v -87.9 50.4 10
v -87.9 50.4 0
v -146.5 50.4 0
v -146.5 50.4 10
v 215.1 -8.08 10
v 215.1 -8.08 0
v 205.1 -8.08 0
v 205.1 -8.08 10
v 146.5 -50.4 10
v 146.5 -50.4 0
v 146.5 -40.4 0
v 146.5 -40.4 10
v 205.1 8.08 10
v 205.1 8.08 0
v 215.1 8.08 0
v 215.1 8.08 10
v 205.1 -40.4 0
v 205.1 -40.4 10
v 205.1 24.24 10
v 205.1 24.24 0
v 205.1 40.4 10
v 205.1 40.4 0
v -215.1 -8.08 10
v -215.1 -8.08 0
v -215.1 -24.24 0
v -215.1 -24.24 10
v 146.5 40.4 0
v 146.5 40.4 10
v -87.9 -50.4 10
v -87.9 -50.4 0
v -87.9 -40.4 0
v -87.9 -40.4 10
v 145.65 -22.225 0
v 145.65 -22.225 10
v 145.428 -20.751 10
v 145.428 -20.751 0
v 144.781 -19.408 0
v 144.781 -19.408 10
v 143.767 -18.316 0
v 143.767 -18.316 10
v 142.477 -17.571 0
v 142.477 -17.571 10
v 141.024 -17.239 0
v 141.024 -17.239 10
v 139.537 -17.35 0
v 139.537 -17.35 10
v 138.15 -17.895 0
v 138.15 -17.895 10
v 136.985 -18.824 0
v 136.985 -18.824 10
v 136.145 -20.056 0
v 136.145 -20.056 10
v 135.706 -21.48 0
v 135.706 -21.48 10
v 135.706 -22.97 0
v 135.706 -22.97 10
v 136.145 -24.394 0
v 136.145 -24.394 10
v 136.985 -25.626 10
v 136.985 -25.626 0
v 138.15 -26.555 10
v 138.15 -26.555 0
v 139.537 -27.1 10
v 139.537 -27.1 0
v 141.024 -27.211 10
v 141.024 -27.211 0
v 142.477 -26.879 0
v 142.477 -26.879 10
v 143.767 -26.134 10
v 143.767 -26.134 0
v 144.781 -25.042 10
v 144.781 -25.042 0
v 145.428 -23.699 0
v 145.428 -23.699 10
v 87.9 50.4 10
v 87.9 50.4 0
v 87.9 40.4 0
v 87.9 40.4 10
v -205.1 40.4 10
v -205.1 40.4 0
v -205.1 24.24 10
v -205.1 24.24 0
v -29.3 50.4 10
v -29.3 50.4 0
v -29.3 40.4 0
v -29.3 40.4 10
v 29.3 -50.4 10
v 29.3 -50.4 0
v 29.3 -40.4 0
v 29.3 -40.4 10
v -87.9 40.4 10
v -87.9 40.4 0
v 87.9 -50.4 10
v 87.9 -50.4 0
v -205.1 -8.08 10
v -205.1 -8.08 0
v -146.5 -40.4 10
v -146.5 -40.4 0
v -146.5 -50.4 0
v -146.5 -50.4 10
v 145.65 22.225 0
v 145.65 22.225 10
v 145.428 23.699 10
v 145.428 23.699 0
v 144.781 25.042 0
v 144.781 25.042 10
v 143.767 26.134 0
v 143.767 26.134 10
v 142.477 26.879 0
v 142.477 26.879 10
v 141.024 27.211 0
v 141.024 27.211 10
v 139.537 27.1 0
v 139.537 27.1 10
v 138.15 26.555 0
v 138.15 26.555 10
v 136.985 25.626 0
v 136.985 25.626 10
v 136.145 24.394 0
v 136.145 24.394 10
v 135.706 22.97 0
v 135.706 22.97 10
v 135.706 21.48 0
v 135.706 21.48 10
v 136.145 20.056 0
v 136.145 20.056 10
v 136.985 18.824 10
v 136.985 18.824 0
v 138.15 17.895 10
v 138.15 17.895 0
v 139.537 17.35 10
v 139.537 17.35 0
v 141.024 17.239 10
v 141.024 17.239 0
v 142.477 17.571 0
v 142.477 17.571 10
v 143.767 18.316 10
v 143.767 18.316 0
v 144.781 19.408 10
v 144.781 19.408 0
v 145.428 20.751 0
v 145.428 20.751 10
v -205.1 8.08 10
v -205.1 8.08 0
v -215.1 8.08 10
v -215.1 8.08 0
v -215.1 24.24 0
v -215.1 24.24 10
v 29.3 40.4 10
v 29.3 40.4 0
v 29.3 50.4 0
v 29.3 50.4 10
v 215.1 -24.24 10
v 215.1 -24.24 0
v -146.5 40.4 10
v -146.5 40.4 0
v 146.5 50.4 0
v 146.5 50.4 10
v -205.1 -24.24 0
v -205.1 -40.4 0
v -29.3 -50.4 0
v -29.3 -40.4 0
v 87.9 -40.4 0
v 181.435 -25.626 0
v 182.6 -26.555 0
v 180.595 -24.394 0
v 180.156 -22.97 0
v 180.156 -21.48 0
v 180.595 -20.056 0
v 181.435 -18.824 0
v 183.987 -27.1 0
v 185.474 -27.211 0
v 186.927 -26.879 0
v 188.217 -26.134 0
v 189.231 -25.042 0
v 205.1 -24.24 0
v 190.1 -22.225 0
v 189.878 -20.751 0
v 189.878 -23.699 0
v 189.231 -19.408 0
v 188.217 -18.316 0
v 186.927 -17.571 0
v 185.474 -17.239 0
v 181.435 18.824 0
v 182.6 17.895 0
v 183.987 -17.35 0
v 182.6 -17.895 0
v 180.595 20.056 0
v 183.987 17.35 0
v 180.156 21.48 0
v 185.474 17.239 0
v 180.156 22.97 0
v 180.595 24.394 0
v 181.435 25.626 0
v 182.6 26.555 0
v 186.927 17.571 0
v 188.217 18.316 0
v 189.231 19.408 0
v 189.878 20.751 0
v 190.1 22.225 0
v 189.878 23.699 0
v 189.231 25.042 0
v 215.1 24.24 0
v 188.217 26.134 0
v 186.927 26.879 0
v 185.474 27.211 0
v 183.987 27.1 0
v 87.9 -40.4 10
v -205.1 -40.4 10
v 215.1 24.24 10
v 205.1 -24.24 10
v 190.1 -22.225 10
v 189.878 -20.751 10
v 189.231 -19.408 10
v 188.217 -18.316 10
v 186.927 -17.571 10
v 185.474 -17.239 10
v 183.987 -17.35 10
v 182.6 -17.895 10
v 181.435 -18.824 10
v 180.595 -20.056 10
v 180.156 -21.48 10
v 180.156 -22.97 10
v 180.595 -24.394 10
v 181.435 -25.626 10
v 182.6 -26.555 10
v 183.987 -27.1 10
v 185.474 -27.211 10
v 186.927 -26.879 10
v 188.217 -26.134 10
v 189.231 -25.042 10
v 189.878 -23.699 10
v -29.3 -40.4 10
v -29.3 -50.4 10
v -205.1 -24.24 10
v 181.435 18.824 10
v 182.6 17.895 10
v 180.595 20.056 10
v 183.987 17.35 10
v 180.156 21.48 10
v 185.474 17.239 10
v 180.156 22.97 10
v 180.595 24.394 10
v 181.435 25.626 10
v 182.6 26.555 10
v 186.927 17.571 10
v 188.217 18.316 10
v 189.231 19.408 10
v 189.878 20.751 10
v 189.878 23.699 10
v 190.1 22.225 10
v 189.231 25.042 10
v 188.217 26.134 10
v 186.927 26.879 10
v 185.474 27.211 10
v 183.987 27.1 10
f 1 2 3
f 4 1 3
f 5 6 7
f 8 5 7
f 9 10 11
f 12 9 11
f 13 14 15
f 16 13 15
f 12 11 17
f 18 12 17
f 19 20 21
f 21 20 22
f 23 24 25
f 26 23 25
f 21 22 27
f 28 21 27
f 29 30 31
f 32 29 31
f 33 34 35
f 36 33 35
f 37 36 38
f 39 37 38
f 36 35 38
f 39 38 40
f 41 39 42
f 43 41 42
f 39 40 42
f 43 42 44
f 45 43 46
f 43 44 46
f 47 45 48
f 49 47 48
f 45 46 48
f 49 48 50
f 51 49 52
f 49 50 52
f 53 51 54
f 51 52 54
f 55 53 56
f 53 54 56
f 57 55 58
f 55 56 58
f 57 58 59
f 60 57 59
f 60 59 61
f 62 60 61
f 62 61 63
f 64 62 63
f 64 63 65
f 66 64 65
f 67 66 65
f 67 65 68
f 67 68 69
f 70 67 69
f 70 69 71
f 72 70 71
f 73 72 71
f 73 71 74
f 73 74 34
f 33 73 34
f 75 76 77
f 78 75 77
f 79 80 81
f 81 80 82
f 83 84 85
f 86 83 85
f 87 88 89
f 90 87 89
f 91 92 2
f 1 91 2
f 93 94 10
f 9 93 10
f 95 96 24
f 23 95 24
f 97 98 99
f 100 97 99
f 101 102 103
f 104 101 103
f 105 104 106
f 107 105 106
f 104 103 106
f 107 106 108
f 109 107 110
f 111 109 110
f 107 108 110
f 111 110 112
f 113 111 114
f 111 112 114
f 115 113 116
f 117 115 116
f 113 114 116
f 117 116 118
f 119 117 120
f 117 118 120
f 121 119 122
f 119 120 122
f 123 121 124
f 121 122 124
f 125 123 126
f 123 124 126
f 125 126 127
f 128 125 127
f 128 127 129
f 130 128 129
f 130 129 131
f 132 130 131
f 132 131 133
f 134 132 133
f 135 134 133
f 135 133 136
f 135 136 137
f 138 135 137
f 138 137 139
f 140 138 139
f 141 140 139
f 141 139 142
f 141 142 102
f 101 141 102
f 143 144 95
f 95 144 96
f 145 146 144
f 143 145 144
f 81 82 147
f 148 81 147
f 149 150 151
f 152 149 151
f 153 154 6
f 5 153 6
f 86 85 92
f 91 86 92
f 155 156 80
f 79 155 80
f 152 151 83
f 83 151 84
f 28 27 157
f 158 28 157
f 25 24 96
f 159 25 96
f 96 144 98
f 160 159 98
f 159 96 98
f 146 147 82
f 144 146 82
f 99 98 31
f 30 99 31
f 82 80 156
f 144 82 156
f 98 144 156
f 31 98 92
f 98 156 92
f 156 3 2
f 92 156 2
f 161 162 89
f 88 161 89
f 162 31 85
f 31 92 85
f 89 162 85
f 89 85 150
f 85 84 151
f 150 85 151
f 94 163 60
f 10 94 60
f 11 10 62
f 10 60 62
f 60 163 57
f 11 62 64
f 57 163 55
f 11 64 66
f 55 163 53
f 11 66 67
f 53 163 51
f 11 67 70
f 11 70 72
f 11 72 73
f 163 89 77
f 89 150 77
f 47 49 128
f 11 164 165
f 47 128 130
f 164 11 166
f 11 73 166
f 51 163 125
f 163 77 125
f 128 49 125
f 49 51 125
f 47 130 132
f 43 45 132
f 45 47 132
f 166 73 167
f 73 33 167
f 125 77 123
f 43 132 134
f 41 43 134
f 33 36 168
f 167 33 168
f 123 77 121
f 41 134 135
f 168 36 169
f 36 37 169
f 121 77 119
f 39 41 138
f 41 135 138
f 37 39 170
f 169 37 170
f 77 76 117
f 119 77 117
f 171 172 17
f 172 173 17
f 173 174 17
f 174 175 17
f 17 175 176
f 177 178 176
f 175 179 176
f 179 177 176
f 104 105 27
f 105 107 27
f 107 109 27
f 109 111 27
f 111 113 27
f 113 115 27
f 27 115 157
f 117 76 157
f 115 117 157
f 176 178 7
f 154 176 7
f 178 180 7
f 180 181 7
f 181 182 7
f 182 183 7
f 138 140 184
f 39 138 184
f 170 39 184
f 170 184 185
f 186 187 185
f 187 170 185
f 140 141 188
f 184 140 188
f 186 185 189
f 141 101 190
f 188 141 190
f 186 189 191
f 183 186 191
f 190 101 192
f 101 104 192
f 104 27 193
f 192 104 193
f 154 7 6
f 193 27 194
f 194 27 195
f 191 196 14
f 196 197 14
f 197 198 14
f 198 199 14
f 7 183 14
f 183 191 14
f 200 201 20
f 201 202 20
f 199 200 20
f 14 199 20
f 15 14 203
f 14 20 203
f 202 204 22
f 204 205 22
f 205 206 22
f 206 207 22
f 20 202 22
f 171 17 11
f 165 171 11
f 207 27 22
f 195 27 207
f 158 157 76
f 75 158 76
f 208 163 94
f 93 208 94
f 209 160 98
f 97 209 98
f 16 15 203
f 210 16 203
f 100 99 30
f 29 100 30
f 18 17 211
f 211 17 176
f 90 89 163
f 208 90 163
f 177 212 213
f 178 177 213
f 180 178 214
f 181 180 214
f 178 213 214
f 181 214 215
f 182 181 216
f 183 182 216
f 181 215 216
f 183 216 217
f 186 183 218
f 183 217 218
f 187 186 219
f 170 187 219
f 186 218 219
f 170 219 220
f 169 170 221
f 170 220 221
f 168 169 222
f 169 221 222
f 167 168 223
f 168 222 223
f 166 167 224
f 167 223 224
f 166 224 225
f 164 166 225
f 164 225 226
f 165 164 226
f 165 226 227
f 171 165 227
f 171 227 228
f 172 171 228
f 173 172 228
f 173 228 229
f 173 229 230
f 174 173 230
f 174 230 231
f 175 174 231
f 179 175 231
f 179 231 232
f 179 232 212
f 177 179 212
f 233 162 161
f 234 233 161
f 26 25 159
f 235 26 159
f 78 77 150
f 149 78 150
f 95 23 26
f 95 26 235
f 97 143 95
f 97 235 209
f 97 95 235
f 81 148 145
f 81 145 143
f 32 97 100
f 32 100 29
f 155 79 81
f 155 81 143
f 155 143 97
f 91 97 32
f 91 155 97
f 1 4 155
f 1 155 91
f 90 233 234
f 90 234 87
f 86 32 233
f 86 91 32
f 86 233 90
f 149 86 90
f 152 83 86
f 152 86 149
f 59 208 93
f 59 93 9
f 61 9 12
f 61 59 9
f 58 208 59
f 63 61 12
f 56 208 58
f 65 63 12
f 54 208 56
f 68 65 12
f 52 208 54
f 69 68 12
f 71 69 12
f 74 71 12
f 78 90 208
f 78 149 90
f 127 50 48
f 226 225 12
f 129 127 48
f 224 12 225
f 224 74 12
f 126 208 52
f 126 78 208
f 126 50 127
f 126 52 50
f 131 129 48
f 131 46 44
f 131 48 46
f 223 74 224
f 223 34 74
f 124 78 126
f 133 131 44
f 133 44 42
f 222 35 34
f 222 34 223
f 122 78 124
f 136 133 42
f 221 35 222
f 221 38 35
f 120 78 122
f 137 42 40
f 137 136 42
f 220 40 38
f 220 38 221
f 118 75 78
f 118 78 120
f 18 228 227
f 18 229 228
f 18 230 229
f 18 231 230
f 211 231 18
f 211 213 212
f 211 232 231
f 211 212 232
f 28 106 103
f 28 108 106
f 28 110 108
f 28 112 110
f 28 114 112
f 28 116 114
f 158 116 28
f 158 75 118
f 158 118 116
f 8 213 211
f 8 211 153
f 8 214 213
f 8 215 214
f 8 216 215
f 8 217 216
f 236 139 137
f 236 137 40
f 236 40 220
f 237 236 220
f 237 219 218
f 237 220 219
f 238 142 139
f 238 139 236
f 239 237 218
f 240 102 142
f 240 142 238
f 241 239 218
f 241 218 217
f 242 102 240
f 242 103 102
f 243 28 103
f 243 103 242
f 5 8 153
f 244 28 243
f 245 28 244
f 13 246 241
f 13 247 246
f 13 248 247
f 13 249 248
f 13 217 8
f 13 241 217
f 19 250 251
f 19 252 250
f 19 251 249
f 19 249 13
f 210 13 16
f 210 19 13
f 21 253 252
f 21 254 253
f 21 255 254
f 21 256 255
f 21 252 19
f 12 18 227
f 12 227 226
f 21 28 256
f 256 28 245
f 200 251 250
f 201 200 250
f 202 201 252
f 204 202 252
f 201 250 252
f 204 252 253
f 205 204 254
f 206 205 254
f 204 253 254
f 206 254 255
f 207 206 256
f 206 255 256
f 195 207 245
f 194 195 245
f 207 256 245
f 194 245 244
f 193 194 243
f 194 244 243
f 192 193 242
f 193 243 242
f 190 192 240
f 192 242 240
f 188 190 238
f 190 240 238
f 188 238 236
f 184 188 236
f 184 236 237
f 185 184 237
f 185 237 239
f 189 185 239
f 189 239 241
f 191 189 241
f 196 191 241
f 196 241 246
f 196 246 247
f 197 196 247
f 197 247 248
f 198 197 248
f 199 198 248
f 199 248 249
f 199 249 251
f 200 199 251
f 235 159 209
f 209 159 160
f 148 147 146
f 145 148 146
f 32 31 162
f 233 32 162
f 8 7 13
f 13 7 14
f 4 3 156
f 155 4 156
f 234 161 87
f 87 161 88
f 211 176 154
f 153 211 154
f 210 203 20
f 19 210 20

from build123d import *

# Parameters (mm, degrees)
BOSS_EXTRUDE1_DEPTH = 10
SKETCH3_R           = 5
CUT_EXTRUDE1_DEPTH  = 222.151916112


with BuildPart() as part:
    # Sketch2 → Boss-Extrude1 (new body)
    with BuildSketch(Plane.XY):
        Polygon((-205.1, 40.4), (-205.1, 24.24), (-215.1, 24.24), (-215.1, 8.08), (-205.1, 8.08), (-205.1, -8.08), (-215.1, -8.08), (-215.1, -24.24), (-205.1, -24.24), (-205.1, -40.4), (-146.5, -40.4), (-146.5, -50.4), (-87.9, -50.4), (-87.9, -40.4), (-29.3, -40.4), (-29.3, -50.4), (29.3, -50.4), (29.3, -40.4), (87.9, -40.4), (87.9, -50.4), (146.5, -50.4), (146.5, -40.4), (205.1, -40.4), (205.1, -24.24), (215.1, -24.24), (215.1, -8.08), (205.1, -8.08), (205.1, 8.08), (215.1, 8.08), (215.1, 24.24), (205.1, 24.24), (205.1, 40.4), (146.5, 40.4), (146.5, 50.4), (87.9, 50.4), (87.9, 40.4), (29.3, 40.4), (29.3, 50.4), (-29.3, 50.4), (-29.3, 40.4), (-87.9, 40.4), (-87.9, 50.4), (-146.5, 50.4), (-146.5, 40.4), align=None)
    extrude(amount=BOSS_EXTRUDE1_DEPTH)

    # Sketch3 → Cut-Extrude1 (cut, through all)
    with BuildSketch(Plane.XY.offset(10)):
        with Locations((185.1, 22.225)):
            Circle(SKETCH3_R)
        with Locations((140.65, 22.225)):
            Circle(SKETCH3_R)
        with Locations((140.65, -22.225)):
            Circle(SKETCH3_R)
        with Locations((185.1, -22.225)):
            Circle(SKETCH3_R)
    extrude(amount=-CUT_EXTRUDE1_DEPTH, mode=Mode.SUBTRACT)


solid = part.part
